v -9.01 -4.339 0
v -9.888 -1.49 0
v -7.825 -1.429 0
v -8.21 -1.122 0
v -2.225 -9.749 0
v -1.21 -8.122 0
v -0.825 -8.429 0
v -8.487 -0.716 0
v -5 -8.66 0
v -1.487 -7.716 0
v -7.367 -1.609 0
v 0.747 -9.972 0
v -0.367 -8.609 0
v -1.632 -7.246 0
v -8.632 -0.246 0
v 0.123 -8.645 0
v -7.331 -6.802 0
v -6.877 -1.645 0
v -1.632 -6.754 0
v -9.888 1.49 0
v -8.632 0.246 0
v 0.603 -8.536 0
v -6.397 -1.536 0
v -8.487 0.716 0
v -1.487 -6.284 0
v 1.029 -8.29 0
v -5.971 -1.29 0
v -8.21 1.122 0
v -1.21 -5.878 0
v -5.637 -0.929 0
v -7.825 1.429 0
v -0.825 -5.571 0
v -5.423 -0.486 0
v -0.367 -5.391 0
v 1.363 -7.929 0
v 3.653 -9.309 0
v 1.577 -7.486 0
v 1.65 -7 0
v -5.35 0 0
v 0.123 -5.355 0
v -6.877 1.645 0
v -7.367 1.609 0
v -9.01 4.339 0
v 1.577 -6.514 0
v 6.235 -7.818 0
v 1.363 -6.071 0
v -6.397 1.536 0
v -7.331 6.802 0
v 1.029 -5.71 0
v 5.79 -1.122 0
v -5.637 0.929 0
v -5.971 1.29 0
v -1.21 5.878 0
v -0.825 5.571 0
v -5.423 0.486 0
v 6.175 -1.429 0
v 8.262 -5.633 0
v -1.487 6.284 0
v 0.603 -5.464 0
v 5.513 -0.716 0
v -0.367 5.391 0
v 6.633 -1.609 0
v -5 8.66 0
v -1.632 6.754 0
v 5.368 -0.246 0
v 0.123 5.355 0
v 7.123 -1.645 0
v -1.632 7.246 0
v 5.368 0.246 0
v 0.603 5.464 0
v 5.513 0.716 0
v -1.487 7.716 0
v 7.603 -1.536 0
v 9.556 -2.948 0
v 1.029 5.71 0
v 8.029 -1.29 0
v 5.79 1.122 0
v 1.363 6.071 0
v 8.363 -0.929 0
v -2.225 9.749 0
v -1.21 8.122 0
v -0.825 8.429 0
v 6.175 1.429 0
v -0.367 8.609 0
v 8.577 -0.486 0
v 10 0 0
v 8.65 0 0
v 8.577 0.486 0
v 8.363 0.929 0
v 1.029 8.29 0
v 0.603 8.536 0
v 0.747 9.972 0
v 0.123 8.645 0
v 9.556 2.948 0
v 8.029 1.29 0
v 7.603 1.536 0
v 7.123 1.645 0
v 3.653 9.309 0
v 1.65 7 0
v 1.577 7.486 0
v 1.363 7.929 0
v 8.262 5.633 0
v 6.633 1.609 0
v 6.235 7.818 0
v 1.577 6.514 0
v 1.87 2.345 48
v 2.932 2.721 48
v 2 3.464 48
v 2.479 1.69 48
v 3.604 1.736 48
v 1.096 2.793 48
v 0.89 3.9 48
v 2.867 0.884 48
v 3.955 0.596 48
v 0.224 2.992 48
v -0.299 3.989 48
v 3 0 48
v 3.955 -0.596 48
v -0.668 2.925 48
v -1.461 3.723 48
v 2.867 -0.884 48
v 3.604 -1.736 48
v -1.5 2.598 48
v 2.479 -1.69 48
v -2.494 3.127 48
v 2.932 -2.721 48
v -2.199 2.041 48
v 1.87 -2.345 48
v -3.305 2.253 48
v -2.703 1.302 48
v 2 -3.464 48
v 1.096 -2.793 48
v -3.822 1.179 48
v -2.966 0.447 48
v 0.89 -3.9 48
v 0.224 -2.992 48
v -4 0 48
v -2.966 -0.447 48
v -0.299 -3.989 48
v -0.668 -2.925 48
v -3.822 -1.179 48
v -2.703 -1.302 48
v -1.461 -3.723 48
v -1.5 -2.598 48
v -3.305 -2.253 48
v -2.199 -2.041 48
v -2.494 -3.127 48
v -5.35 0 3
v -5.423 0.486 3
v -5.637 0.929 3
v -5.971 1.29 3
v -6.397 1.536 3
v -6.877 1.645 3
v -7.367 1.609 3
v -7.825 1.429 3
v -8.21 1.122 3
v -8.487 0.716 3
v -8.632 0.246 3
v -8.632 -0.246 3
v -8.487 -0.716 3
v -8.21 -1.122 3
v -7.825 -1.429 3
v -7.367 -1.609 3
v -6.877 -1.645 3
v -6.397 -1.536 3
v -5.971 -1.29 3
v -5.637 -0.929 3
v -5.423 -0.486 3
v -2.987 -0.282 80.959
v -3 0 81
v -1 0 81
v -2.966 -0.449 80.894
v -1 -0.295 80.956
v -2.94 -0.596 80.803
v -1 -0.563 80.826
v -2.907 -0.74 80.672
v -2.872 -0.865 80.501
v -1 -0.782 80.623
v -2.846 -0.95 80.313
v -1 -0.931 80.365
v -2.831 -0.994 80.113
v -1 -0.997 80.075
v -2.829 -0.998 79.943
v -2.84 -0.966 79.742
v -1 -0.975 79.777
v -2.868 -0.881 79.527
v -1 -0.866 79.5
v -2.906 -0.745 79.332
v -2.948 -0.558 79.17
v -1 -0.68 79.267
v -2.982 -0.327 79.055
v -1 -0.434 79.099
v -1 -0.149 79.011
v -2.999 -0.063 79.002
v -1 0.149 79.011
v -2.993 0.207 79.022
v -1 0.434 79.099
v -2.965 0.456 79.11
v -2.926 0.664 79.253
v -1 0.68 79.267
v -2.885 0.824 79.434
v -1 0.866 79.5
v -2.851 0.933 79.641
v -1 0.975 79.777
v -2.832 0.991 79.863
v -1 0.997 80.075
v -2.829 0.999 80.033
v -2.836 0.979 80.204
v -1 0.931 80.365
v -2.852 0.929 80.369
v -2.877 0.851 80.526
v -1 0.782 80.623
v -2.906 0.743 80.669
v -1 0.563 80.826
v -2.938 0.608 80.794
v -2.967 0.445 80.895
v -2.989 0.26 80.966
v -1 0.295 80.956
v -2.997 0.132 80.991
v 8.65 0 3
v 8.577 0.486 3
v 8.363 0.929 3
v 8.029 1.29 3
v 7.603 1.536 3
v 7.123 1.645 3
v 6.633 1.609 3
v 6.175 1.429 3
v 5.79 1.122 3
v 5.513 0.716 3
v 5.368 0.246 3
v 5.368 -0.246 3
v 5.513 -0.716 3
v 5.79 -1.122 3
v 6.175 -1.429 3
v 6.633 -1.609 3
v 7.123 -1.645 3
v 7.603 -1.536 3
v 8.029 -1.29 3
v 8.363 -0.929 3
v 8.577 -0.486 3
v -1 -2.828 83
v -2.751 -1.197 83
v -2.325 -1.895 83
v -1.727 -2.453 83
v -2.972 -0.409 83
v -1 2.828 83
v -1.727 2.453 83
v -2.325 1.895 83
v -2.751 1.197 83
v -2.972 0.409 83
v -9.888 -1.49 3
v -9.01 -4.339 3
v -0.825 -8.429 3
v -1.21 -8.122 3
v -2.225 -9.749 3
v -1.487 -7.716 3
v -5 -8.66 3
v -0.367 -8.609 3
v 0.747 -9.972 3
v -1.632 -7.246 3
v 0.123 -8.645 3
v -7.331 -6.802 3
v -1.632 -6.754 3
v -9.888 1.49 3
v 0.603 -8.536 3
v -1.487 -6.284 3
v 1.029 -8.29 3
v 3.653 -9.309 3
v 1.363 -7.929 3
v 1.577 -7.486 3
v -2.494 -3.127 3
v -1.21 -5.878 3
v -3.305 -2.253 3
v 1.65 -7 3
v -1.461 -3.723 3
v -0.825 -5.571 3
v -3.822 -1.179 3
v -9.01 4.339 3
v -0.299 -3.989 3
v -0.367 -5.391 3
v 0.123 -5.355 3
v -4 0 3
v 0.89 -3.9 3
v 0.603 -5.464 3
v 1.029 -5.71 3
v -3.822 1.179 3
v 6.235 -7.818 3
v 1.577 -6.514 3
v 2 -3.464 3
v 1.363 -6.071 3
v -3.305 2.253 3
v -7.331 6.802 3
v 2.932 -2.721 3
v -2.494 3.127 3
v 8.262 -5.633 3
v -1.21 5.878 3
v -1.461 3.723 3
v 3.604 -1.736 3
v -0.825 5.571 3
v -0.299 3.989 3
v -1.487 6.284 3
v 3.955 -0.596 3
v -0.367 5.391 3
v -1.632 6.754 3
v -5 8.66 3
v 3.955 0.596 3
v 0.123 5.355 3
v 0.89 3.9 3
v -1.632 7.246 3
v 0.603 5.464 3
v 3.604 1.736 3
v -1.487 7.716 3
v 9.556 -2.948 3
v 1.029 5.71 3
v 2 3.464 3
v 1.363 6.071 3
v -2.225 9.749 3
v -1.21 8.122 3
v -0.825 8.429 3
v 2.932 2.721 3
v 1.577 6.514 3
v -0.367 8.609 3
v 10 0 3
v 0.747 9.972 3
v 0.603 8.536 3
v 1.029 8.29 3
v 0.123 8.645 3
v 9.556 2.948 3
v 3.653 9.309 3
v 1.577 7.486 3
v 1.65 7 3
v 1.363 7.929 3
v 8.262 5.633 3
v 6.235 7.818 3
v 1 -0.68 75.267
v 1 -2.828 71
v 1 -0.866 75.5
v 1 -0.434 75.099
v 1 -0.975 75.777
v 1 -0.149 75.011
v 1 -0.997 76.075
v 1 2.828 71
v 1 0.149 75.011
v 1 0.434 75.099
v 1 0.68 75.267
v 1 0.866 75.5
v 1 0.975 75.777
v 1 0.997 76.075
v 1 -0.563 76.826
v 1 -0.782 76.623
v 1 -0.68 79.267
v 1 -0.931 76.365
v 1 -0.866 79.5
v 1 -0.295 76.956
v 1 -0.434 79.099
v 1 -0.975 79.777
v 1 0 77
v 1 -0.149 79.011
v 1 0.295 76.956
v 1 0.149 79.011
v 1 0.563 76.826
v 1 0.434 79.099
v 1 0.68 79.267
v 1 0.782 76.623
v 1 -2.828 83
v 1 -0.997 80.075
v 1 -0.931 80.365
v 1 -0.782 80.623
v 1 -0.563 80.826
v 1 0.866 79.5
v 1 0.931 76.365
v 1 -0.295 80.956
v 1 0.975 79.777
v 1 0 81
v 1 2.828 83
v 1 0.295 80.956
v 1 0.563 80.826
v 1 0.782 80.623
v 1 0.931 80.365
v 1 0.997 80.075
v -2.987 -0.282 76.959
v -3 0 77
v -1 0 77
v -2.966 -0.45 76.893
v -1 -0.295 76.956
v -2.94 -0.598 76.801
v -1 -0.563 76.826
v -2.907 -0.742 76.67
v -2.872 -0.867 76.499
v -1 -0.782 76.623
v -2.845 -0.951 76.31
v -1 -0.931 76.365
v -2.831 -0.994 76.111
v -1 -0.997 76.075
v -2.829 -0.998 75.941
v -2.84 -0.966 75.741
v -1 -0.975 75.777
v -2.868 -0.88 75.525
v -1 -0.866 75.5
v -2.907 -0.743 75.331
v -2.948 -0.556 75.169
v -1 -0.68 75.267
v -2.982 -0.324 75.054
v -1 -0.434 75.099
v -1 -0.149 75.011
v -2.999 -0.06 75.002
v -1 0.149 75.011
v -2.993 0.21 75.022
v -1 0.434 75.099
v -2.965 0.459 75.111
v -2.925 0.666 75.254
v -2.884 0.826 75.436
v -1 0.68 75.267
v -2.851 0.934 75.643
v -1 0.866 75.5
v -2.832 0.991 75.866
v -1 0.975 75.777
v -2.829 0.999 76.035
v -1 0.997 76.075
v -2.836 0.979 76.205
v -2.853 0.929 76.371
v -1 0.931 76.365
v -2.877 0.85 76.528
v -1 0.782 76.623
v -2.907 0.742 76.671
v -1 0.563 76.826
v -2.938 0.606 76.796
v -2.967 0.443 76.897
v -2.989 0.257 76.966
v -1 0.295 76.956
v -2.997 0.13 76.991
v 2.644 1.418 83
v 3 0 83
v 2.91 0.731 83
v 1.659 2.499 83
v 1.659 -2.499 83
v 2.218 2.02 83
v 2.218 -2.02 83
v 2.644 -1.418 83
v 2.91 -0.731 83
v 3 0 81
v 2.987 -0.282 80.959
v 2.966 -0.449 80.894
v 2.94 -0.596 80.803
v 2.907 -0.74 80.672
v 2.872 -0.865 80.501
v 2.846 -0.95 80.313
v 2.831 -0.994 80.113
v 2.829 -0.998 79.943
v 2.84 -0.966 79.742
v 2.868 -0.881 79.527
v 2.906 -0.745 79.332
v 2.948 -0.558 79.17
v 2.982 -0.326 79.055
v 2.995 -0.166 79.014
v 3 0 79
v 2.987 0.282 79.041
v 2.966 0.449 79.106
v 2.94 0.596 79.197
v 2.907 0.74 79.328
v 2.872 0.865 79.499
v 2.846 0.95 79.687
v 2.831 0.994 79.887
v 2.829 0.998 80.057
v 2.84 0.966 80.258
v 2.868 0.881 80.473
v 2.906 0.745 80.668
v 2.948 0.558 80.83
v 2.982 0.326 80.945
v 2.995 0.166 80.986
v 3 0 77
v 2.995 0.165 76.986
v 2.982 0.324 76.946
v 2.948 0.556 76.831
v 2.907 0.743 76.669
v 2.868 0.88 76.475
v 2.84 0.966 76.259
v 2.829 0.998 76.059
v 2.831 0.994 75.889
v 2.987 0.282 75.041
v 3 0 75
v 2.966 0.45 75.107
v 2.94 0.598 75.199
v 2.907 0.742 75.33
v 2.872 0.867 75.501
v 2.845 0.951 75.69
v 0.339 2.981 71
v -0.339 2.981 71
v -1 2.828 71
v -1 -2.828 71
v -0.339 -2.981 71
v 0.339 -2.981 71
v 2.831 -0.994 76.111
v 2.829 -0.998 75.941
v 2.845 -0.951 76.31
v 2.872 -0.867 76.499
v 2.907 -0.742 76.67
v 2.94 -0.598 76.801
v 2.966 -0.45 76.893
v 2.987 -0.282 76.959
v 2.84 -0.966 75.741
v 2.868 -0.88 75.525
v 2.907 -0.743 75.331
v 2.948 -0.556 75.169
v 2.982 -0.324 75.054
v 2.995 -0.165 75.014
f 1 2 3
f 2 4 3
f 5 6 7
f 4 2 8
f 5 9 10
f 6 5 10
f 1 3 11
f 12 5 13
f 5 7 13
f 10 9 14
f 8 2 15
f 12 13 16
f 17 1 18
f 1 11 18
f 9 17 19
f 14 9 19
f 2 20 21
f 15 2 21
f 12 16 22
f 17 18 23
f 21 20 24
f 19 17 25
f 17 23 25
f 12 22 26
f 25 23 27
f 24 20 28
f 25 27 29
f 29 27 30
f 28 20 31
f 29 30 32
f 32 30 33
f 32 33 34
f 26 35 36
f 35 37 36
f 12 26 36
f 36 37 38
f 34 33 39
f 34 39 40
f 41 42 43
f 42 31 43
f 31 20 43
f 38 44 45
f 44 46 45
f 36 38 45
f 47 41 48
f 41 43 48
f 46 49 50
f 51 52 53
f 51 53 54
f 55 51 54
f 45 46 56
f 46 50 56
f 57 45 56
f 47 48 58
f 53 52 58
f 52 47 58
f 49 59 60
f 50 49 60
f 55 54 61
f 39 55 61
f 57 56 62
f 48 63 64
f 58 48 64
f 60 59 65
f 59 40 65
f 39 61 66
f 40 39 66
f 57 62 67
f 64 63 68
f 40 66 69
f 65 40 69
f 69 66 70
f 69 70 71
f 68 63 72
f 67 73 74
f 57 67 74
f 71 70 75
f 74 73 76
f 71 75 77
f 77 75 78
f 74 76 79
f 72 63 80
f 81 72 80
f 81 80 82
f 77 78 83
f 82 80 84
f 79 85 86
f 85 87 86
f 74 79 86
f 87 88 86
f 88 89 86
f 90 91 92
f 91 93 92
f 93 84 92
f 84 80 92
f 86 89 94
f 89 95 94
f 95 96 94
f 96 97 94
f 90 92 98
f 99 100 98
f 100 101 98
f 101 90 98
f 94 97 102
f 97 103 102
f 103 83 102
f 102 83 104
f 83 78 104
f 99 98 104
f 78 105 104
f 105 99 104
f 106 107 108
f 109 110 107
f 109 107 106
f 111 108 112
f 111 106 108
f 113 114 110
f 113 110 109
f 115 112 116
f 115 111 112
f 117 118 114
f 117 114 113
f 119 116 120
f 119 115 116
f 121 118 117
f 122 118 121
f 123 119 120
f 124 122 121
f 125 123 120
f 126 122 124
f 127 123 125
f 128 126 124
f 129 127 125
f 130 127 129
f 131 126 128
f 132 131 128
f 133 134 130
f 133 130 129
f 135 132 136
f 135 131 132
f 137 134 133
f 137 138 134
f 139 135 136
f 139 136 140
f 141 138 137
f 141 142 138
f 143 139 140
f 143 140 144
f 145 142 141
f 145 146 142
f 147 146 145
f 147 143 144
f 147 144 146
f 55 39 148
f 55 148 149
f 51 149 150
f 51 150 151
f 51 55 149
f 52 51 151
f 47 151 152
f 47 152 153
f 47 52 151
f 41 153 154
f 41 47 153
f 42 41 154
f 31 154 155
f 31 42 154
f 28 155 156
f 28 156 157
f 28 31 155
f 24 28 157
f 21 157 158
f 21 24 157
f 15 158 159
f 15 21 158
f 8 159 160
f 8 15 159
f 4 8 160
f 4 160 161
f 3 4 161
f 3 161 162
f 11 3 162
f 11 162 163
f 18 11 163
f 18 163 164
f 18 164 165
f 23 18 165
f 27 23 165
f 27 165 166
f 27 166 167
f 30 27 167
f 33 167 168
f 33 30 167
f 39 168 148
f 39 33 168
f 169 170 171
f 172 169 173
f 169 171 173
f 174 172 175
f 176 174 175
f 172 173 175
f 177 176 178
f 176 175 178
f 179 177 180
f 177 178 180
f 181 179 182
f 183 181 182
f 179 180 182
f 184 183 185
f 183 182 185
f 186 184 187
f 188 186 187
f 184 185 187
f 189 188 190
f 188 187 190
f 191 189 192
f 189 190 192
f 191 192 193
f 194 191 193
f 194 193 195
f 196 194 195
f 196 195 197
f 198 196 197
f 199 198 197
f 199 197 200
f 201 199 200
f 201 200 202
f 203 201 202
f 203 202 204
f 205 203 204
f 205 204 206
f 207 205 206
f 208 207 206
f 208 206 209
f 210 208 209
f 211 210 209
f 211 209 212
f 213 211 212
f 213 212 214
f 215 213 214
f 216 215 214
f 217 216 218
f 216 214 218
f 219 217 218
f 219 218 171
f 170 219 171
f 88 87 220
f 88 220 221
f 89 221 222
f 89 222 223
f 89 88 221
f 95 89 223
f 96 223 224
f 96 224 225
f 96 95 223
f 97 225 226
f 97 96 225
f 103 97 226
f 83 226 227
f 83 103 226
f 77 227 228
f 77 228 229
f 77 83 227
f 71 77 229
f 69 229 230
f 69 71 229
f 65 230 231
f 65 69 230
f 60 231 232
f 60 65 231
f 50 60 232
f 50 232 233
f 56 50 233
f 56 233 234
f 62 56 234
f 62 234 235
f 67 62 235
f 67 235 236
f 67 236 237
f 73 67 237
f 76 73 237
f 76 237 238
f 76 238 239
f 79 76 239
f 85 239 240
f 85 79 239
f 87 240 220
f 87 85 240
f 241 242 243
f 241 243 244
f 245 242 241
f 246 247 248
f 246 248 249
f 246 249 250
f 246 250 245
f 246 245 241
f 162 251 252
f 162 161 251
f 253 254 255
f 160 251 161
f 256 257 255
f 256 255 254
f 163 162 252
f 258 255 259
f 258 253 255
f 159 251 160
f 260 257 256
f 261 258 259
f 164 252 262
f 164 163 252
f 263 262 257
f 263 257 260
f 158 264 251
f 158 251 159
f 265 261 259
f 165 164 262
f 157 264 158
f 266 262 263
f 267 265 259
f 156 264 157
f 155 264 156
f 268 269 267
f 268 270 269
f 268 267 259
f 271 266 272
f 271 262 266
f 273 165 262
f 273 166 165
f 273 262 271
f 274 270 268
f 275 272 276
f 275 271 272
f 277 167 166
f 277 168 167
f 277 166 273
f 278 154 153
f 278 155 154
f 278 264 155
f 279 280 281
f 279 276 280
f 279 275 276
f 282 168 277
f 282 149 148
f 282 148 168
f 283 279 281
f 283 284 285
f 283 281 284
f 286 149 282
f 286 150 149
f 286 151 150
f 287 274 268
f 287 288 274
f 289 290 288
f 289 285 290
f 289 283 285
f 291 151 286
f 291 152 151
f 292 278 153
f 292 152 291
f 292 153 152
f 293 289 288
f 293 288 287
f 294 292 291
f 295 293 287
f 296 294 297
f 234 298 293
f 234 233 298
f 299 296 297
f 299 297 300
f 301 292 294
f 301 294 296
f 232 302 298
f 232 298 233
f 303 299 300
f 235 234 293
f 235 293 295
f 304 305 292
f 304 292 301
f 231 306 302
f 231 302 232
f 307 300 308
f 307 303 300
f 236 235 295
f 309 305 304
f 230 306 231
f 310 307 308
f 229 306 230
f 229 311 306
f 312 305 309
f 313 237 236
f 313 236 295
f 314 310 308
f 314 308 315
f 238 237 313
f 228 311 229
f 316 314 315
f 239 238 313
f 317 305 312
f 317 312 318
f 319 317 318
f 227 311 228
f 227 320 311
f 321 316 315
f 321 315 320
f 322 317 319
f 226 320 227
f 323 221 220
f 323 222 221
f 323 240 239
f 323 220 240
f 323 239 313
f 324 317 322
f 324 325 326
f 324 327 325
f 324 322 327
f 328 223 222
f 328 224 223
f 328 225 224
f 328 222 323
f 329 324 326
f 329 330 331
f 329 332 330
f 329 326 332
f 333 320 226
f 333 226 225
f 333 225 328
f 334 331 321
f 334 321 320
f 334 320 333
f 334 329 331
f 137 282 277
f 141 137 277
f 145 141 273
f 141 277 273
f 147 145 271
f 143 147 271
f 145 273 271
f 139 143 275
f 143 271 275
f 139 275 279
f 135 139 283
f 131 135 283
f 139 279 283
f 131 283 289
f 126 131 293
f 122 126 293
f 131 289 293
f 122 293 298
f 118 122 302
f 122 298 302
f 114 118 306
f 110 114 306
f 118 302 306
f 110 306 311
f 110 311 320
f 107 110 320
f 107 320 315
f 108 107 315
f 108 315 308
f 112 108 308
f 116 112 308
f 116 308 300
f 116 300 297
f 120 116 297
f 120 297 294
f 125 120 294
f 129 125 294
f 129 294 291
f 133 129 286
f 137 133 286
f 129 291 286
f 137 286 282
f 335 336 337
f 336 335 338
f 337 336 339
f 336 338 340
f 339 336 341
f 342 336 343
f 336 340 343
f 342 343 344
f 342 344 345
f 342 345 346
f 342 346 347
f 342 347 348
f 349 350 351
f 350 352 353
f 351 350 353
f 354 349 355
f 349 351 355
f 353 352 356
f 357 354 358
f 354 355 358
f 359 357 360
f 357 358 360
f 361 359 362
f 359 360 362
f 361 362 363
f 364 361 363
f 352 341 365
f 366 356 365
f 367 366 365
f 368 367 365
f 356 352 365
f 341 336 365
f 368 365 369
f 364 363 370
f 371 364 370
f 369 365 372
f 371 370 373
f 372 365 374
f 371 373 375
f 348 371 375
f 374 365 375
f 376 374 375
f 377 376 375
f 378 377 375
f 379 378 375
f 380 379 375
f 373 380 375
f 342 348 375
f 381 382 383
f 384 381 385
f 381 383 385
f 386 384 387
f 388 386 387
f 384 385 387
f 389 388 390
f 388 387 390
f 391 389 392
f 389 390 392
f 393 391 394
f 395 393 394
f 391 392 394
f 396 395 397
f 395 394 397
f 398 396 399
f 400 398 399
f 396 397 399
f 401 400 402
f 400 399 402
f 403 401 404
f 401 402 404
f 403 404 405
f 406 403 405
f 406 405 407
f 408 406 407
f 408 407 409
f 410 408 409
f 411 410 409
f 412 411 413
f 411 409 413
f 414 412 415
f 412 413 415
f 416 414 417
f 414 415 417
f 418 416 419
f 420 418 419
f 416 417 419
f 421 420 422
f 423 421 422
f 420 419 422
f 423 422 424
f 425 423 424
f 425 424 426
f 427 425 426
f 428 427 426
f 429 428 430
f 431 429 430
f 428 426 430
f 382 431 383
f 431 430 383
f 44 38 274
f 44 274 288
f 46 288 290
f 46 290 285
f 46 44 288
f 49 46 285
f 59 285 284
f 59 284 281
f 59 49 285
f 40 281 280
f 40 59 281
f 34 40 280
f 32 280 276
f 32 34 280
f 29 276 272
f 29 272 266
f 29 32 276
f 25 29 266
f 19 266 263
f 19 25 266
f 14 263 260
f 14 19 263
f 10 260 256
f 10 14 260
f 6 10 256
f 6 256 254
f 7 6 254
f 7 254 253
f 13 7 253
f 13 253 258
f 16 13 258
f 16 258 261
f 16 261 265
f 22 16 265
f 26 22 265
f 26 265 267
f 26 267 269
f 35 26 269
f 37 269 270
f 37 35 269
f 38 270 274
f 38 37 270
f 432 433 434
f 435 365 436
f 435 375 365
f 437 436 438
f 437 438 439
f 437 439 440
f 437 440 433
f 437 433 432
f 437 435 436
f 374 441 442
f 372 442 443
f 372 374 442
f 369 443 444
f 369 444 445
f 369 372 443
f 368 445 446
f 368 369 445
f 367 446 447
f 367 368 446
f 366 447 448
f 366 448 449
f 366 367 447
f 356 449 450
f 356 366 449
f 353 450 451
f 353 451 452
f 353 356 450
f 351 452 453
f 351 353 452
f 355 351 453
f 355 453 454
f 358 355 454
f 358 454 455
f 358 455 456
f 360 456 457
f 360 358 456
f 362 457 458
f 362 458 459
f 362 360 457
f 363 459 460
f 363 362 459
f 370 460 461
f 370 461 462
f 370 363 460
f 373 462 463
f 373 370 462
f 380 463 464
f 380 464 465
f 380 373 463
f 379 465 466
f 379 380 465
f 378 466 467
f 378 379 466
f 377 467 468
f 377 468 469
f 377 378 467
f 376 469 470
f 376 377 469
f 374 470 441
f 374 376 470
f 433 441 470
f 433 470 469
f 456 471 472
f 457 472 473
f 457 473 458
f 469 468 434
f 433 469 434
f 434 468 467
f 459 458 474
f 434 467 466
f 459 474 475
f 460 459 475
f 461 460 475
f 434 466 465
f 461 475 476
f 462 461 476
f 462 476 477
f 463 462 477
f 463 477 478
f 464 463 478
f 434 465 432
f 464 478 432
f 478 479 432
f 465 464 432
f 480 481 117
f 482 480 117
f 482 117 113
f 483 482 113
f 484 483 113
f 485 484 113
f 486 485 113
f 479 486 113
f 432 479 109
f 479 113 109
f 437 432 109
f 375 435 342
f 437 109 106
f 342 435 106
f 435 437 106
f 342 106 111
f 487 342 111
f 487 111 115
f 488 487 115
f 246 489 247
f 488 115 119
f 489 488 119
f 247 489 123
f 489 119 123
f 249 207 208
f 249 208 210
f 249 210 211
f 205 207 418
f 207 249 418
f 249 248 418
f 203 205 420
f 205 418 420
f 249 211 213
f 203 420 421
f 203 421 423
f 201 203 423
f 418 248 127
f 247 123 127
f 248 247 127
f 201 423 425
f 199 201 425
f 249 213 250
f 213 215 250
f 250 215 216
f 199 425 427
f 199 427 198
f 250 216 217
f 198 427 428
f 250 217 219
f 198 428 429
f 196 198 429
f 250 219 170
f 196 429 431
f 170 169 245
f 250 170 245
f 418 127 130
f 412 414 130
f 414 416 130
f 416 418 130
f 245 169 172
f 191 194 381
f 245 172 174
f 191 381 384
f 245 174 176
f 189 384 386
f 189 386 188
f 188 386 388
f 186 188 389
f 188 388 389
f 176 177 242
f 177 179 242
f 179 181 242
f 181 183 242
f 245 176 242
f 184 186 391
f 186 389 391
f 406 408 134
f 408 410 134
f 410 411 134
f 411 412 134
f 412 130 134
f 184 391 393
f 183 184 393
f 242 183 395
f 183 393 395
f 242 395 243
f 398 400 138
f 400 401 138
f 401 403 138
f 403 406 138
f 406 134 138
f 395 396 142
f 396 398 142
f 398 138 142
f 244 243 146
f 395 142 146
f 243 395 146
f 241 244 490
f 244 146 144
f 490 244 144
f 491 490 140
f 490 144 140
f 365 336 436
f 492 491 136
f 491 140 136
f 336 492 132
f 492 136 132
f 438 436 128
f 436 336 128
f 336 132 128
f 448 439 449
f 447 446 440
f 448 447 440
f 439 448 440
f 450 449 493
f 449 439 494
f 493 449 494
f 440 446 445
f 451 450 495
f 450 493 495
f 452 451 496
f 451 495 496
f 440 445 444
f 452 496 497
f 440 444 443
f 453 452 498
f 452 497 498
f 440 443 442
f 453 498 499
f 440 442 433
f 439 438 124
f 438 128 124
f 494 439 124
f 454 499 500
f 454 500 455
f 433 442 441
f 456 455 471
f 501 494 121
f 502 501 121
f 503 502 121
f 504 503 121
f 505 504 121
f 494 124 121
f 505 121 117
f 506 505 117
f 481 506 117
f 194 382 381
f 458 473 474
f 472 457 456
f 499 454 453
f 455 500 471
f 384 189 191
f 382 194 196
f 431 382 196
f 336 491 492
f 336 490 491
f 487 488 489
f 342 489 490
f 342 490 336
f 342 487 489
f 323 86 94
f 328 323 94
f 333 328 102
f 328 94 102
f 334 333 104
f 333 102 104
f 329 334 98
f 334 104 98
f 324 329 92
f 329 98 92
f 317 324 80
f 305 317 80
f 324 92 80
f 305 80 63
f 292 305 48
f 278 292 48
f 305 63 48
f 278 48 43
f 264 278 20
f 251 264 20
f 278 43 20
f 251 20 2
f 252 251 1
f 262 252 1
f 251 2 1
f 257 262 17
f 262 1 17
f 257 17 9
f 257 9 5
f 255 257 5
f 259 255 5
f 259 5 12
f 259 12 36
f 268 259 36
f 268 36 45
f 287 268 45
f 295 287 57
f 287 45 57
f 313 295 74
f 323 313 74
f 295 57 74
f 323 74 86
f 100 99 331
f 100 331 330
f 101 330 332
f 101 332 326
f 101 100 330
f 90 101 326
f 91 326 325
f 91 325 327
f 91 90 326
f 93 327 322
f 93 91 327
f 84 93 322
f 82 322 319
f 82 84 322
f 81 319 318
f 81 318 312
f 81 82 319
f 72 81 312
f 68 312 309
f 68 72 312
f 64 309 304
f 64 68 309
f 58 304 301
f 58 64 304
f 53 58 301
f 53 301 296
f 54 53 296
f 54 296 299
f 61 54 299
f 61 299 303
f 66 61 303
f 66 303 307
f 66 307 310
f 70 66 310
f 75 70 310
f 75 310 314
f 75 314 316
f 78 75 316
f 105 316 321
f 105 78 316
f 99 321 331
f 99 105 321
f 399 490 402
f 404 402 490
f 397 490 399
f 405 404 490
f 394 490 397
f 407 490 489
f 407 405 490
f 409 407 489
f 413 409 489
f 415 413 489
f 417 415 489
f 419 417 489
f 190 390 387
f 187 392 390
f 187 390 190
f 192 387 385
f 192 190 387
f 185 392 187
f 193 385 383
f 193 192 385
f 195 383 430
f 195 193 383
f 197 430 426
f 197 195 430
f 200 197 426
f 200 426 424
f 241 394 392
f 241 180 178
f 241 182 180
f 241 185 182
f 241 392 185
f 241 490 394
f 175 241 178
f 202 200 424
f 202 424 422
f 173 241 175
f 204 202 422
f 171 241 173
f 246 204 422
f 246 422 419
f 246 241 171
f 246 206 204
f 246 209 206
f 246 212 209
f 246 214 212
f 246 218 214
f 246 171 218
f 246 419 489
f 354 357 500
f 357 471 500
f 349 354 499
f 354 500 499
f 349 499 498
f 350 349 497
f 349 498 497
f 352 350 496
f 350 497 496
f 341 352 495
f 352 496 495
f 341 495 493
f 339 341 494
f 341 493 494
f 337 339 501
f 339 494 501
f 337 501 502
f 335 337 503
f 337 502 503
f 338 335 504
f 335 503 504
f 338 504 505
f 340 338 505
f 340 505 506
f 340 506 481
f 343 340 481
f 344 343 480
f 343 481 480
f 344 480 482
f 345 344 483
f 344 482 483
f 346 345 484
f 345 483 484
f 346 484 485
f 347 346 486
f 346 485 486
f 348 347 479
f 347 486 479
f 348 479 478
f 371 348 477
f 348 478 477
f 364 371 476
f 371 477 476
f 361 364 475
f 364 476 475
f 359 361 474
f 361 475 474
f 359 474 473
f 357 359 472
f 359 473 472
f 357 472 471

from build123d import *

# Parameters (mm, degrees)
SKETCH_1_R          = 10
SKETCH_1_R_2        = 1.65
EXTRUDE_1_DEPTH     = 3
SKETCH_2_R          = 3
EXTRUDE_2_DEPTH     = 80
SKETCH_3_W          = 2
SKETCH_3_H          = 7.743354912
CUT_EXTRUDE_1_DEPTH = 12
SKETCH_5_R          = 1
CUT_EXTRUDE_2_DEPTH = 5
SKETCH_6_R          = 4
EXTRUDE_3_DEPTH     = 45


with BuildPart() as part:
    # 草图1 → 凸台-拉伸1 (new body)
    with BuildSketch(Plane.XY):
        Circle(SKETCH_1_R)
        with Locations((0, 7)):
            Circle(SKETCH_1_R_2, mode=Mode.SUBTRACT)
        with Locations((7, 0)):
            Circle(SKETCH_1_R_2, mode=Mode.SUBTRACT)
        with Locations((0, -7)):
            Circle(SKETCH_1_R_2, mode=Mode.SUBTRACT)
        with Locations((-7, 0)):
            Circle(SKETCH_1_R_2, mode=Mode.SUBTRACT)
    extrude(amount=EXTRUDE_1_DEPTH)

    # 草图2 → 凸台-拉伸2 (add)
    with BuildSketch(Plane.XY.offset(3)):
        Circle(SKETCH_2_R)
    extrude(amount=EXTRUDE_2_DEPTH)

    # 草图3 → 切除-拉伸1 (cut)
    with BuildSketch(Plane.XY.offset(83)):
        Rectangle(SKETCH_3_W, SKETCH_3_H)
    extrude(amount=-CUT_EXTRUDE_1_DEPTH, mode=Mode.SUBTRACT)

    # 草图5 → 切除-拉伸2 (cut, symmetric)
    with BuildSketch(Plane(origin=(-1, 0, 0), x_dir=(0, 0, -1), z_dir=(1, 0, 0))):
        with Locations(Location((-80, 0, 0), (0, 0, 180))):
            Circle(SKETCH_5_R)
        with Locations(Location((-76, 0, 0), (0, 0, 180))):
            Circle(SKETCH_5_R)
    extrude(amount=CUT_EXTRUDE_2_DEPTH, both=True, mode=Mode.SUBTRACT)

    # 草图6 → 凸台-拉伸3 (add)
    with BuildSketch(Plane.XY.offset(3)):
        with Locations(Location((0, 0, 0), (0, 0, 180))):
            Circle(SKETCH_6_R)
    extrude(amount=EXTRUDE_3_DEPTH)


solid = part.part
